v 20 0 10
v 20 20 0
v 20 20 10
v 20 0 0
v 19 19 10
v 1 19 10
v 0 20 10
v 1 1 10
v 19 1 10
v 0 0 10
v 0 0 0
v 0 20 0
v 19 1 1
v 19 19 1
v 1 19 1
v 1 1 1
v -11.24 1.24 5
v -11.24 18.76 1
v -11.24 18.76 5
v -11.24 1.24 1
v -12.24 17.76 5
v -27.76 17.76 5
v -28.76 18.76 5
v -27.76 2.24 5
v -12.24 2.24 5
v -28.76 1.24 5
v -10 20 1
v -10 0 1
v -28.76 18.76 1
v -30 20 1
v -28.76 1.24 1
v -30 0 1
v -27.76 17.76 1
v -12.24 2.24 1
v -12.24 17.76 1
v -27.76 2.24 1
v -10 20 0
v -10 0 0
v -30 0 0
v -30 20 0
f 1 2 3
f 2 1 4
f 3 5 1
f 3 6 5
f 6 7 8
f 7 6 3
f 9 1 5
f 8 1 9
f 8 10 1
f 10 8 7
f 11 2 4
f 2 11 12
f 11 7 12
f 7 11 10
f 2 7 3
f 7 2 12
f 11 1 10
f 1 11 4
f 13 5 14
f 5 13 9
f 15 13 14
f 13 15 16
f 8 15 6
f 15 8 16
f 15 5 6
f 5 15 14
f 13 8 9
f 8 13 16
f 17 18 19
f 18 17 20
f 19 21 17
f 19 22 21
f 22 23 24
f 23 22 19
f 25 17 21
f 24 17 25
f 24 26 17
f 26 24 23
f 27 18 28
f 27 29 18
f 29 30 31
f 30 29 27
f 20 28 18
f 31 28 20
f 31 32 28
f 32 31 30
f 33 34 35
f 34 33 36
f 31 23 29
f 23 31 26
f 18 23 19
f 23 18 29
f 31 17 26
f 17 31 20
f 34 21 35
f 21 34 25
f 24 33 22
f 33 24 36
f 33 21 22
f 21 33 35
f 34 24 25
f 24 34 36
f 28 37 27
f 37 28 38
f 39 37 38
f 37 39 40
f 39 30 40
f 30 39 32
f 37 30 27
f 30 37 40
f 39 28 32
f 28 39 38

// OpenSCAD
// Customizable box with lid
// by Hari Wiguna, Oct 2013

// Box Width (mm)
boxX = 20;

// Box Depth (mm)
boxY = 20;

// Box Height (mm)
boxZ = 10;

// Wall Thickness (mm)
wallT = 1;

// Lid lip height (mm)
lidZ = 5;

// (mm. Smaller number means tighter fit)
lidClearance = 0.24;

// Choose No if you're just tweaking the lid clearance
printBox = 1; // [1:Yes,0:No]

printLid = 1; // [1:Yes,0:No]

t2 = wallT * 2;
t4 = wallT * 4;

// Generate Box & Lid
union()
{
	Box();
	translate([-boxX-10,0,0]) Lid();
}

module Box()
{
	if (printBox==1)
	difference()
	{
		// Outer box
		cube([boxX, boxY, boxZ]);

		// Subtract inner void
		translate([wallT, wallT, wallT])
			cube([boxX-t2,boxY-t2,boxZ]);
	}
}

module Lid()
{
	if (printLid==1)
	union()
	{
		cube([boxX, boxY, wallT]);
		LidInset(boxX, boxY, lidZ);
	}
}

module LidInset(x,y,z)
{
	f = lidClearance;
	translate([wallT+f, wallT+f, wallT])
	difference()
	{
		cube([x-2*(wallT+f), y-2*(wallT+f), z-wallT]);

		translate([wallT,wallT,0])
			cube([x-t4-(2*f), y-t4-(2*f), z]);
	}
}
